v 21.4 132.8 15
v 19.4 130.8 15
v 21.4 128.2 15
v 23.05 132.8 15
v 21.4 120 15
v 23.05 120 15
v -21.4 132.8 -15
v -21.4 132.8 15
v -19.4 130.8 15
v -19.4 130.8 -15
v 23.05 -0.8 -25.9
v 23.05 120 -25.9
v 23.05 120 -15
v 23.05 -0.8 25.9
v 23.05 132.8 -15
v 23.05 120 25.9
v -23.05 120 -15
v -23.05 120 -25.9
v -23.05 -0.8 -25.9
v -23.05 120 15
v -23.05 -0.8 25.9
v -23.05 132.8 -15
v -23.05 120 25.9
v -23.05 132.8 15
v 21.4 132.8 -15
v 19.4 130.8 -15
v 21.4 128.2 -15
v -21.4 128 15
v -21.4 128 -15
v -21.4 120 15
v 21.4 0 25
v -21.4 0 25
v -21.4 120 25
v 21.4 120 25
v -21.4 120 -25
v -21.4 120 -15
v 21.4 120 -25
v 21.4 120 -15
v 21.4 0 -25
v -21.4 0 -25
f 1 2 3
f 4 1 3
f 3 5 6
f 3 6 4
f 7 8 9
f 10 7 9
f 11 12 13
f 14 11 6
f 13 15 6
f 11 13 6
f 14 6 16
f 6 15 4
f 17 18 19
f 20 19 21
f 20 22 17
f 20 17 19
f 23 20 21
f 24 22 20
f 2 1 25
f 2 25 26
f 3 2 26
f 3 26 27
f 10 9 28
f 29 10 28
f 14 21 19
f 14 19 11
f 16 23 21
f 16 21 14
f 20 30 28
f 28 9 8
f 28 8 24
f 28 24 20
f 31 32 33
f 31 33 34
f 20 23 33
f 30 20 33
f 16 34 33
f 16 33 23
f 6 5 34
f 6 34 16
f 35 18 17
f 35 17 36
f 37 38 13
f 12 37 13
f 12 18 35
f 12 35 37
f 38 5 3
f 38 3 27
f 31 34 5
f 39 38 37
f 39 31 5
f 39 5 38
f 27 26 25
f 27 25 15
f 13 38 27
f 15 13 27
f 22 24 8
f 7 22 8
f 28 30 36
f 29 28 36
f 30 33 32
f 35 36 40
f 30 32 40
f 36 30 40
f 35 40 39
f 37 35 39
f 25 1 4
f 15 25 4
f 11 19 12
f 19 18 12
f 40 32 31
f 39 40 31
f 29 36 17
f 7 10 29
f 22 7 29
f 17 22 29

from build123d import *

# Parameters (mm, degrees)
SKETCH1_W           = 46.1
SKETCH1_H           = 51.8
SKETCH1_W_2         = 42.8
SKETCH1_H_2         = 50
BOSS_EXTRUDE1_DEPTH = 120
SKETCH2_W           = 1.65
SKETCH2_H           = 30
BOSS_EXTRUDE2_DEPTH = 12.8
BOSS_EXTRUDE5_DEPTH = 30
SKETCH6_W           = 46.1
SKETCH6_H           = 51.8
BOSS_EXTRUDE6_DEPTH = 0.8


with BuildPart() as part:
    # Sketch1 → Boss-Extrude1 (new body)
    with BuildSketch(Plane(origin=(0, 0, 0), x_dir=(1, 0, 0), z_dir=(0, 1, 0))):
        Rectangle(SKETCH1_W, SKETCH1_H)
        Rectangle(SKETCH1_W_2, SKETCH1_H_2, mode=Mode.SUBTRACT)
    extrude(amount=BOSS_EXTRUDE1_DEPTH)

    # Sketch2 → Boss-Extrude2 (add)
    with BuildSketch(Plane(origin=(0, 120, 0), x_dir=(1, 0, 0), z_dir=(0, 1, 0))):
        with Locations((22.225, 0)):
            Rectangle(SKETCH2_W, SKETCH2_H)
        with Locations((-22.225, 0)):
            Rectangle(SKETCH2_W, SKETCH2_H)
    extrude(amount=BOSS_EXTRUDE2_DEPTH)

    # Sketch5 → Boss-Extrude5 (add)
    with BuildSketch(Plane.XY.offset(15)):
        Polygon((-19.4, 130.8), (-21.4, 128), (-21.4, 132.8), align=None)
        Polygon((21.4, 128.2), (21.4, 132.8), (19.4, 130.8), align=None)
    extrude(amount=-BOSS_EXTRUDE5_DEPTH)

    # Sketch6 → Boss-Extrude6 (add)
    with BuildSketch(Plane.XZ):
        Rectangle(SKETCH6_W, SKETCH6_H)
    extrude(amount=BOSS_EXTRUDE6_DEPTH)


solid = part.part
